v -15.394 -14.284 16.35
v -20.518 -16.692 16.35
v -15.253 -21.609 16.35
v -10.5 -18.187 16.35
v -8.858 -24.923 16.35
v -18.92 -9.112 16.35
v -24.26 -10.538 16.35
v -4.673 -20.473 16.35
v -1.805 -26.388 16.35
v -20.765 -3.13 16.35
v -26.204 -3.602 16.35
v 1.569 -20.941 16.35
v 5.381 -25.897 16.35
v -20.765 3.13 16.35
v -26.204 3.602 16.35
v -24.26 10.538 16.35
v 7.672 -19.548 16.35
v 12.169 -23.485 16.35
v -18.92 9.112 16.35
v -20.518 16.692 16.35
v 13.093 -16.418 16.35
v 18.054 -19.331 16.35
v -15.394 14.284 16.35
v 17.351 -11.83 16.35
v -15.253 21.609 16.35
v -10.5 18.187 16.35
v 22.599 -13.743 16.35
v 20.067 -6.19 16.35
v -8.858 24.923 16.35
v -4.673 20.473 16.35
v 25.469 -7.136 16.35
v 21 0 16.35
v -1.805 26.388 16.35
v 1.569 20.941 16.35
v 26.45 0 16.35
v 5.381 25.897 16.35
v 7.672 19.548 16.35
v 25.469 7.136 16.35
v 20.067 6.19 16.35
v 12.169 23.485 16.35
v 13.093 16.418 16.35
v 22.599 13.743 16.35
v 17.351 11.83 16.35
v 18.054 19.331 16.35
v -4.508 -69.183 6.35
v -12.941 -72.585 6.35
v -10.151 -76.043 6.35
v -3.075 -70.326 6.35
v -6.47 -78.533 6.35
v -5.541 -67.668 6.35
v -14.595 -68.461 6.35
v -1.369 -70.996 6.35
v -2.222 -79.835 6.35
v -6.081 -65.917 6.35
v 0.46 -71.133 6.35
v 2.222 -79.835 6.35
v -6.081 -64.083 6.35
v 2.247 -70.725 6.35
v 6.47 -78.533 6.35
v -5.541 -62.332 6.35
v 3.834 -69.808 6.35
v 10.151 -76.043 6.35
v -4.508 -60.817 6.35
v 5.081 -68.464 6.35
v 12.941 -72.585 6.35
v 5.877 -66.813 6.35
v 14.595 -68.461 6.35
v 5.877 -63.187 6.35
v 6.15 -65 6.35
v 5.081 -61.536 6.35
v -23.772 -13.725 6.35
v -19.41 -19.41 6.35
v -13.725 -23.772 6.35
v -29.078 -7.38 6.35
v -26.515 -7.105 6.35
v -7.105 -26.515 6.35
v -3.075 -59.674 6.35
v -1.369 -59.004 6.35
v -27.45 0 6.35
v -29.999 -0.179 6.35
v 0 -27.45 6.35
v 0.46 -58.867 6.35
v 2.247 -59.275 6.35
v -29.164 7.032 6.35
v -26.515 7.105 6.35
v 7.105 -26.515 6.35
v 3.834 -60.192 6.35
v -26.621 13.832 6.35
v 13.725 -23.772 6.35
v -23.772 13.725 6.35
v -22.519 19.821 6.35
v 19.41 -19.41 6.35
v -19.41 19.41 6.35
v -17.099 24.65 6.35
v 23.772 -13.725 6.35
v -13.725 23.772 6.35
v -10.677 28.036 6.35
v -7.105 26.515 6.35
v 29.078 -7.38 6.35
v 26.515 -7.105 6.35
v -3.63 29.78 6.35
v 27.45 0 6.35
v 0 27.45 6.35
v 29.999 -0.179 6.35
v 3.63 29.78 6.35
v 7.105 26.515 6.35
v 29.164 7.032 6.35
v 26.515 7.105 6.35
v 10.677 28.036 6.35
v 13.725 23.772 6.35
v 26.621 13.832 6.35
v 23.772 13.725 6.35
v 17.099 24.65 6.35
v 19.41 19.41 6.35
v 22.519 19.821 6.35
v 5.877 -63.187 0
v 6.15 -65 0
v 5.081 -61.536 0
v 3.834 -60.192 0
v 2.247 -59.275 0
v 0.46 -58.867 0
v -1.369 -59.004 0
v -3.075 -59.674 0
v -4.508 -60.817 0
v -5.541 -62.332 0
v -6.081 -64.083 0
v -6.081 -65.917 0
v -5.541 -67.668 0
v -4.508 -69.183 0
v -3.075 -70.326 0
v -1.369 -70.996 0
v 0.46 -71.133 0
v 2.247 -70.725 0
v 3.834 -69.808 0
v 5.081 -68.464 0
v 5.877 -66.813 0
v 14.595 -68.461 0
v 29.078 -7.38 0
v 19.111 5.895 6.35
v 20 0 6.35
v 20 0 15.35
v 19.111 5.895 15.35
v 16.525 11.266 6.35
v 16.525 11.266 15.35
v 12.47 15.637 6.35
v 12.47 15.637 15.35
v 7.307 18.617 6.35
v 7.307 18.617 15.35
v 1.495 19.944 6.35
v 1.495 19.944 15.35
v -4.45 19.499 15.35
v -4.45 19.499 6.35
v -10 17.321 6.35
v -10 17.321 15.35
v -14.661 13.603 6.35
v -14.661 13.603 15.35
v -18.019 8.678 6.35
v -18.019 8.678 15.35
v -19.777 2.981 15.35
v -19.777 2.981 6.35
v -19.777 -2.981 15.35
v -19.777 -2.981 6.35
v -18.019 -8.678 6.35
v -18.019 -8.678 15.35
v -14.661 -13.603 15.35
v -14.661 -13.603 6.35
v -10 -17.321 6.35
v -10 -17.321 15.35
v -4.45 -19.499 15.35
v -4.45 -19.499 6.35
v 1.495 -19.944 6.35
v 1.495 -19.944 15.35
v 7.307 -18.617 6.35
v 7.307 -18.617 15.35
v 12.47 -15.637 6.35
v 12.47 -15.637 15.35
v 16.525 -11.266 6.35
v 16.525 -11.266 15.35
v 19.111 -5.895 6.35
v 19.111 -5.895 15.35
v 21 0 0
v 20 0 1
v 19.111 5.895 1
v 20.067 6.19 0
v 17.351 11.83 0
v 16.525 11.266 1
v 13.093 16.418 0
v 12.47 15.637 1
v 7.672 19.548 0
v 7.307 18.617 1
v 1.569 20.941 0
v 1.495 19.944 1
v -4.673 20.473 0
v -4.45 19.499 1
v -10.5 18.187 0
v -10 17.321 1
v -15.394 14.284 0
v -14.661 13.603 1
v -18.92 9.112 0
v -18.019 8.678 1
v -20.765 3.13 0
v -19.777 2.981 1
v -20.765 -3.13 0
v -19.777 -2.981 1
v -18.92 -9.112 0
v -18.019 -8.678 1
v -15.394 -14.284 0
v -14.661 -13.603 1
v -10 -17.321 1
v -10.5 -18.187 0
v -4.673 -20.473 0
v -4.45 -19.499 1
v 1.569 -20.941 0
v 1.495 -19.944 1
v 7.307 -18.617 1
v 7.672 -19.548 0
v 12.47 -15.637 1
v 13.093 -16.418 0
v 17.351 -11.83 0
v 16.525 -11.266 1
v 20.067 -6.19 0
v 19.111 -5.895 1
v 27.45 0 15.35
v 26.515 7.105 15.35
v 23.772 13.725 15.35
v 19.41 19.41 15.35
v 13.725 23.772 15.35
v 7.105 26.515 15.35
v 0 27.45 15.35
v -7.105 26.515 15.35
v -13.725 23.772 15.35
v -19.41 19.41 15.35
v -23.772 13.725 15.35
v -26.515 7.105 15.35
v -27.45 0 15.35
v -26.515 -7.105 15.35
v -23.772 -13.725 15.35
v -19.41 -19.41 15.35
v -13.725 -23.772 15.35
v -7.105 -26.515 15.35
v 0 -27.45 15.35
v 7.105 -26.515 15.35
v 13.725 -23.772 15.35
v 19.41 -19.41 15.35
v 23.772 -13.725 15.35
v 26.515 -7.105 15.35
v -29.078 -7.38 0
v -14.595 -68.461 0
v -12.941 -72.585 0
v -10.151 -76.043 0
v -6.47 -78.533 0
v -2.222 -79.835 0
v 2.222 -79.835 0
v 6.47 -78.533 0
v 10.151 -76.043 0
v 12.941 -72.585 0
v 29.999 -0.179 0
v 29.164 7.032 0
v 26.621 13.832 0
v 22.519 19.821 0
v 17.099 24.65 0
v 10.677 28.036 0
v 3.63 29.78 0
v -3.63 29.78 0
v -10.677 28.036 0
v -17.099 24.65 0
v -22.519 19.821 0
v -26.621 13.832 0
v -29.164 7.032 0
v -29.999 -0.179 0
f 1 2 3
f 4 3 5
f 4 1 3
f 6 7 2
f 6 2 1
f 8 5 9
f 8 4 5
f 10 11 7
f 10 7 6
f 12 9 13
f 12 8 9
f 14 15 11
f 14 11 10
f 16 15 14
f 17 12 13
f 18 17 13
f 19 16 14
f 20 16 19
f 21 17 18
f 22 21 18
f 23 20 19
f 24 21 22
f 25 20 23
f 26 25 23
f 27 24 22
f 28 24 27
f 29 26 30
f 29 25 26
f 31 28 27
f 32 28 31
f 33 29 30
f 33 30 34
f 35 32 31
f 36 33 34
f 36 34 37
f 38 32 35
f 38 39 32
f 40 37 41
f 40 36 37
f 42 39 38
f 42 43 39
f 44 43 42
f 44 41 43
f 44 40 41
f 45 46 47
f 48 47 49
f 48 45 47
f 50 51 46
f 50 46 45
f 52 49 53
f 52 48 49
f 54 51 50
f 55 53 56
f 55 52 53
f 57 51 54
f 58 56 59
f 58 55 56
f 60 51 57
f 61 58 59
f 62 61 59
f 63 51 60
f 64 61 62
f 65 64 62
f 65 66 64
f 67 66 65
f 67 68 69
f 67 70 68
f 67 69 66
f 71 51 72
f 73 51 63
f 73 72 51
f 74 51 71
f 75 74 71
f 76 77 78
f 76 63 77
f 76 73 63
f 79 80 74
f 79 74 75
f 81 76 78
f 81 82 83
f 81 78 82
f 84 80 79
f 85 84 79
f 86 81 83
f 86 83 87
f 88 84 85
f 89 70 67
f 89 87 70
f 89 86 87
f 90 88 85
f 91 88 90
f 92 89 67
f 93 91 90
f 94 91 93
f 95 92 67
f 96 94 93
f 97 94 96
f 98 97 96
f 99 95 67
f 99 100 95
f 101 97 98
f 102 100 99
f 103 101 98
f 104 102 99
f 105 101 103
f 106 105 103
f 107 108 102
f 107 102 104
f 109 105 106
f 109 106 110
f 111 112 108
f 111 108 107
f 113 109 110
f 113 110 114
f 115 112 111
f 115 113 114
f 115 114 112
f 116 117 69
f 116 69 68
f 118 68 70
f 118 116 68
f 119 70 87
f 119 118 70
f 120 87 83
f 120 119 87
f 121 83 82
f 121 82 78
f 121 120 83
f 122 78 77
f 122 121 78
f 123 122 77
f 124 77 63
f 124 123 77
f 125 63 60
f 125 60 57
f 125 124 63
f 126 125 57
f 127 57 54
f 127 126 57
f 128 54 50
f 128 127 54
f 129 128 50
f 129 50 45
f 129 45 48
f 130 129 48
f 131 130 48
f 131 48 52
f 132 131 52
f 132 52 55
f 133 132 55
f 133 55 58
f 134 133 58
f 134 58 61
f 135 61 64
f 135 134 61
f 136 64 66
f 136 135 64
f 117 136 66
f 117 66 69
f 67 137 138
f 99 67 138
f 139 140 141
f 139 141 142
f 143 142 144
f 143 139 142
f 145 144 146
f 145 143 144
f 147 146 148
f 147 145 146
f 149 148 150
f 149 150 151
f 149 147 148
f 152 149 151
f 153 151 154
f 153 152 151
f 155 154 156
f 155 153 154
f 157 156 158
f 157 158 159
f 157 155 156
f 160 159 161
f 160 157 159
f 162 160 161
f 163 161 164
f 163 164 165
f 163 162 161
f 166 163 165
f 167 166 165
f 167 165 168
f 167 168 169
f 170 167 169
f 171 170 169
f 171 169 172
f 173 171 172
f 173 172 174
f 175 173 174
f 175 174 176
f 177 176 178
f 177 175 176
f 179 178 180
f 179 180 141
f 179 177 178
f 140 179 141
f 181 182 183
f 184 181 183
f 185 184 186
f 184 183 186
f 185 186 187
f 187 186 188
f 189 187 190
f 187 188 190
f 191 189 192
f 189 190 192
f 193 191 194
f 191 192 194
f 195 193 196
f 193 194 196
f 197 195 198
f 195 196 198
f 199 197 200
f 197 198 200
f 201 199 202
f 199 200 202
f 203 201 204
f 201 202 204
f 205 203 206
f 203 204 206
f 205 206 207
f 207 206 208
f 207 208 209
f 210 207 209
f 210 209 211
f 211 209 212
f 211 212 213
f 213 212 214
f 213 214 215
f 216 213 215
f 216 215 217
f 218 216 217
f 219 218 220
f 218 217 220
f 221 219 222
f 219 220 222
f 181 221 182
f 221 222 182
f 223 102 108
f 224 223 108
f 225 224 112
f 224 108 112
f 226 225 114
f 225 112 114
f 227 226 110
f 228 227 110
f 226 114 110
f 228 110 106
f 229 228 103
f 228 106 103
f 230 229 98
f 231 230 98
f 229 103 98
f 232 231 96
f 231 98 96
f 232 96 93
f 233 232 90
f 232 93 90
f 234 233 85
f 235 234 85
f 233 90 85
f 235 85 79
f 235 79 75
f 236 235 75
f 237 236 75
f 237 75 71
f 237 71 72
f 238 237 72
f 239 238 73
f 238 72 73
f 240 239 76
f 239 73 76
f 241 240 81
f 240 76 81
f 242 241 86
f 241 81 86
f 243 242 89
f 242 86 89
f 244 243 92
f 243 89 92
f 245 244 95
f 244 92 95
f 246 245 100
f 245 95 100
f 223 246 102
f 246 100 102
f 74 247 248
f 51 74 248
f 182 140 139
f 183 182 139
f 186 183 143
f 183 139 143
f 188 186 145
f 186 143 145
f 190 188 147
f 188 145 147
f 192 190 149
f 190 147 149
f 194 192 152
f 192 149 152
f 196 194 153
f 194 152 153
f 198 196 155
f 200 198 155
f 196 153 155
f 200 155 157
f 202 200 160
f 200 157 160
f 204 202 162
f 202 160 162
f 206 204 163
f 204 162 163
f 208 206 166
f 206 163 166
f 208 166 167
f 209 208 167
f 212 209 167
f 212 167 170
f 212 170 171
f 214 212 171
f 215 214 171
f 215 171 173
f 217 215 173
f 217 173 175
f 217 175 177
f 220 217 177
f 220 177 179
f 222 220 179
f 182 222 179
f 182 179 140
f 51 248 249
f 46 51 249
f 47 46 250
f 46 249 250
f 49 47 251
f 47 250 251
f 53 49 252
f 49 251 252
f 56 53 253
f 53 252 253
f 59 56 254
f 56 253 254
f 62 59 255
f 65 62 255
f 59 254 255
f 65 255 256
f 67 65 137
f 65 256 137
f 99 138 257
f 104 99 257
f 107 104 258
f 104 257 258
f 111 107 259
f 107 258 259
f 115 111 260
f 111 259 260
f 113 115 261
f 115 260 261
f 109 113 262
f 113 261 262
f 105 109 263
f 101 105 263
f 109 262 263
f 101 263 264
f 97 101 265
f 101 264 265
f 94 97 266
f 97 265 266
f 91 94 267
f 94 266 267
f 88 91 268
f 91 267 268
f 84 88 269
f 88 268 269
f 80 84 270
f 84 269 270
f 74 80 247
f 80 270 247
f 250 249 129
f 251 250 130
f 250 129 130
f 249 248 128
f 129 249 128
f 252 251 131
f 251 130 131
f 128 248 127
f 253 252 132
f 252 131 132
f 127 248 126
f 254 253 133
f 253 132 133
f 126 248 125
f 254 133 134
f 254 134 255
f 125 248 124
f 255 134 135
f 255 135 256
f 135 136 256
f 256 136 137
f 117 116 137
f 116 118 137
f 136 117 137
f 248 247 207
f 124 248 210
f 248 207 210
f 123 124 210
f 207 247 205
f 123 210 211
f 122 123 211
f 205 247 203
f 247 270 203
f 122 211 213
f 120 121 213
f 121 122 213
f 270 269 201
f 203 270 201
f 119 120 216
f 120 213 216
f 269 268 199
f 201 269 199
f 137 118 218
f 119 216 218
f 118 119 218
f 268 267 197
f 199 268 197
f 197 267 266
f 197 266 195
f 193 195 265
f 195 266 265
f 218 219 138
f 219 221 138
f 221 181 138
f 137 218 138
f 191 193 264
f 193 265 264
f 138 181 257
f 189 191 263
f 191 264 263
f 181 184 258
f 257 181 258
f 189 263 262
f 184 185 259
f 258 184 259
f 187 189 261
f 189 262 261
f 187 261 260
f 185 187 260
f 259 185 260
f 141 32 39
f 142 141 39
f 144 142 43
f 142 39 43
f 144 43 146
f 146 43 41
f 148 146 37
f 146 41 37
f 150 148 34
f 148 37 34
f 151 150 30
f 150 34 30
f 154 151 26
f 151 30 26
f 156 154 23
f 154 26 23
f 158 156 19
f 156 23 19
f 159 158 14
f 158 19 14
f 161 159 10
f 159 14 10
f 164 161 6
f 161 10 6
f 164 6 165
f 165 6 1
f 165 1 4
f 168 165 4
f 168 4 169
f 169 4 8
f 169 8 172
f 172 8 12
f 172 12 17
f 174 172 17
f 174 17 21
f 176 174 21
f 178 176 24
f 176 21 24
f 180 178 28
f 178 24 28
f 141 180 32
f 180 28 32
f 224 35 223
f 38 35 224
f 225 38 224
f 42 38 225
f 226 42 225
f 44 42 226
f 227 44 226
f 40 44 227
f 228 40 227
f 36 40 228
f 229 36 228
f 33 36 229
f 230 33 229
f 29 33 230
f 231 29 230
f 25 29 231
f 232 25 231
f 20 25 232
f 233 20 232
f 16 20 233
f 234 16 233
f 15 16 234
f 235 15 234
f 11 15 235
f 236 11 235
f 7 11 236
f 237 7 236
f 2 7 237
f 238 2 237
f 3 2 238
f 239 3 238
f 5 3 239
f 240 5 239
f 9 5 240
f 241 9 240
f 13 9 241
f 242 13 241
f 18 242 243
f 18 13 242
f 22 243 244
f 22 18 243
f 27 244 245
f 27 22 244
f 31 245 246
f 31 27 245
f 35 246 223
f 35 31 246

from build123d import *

# Parameters (mm, degrees)
CROQUIS1_R                          = 25
CROQUIS1_R_2                        = 6.15
SALIENTE_EXTRUIR1_DEPTH             = 6.35
CROQUIS2_R                          = 27.45
CROQUIS2_R_2                        = 20
SALIENTE_EXTRUIR2_DEPTH             = 10
SALIENTE_EXTRUIR2_DIRECTION_2_REACH = 87.676
CHAFL_N1_SIZE                       = 1


with BuildPart() as part:
    # Croquis1 → Saliente-Extruir1 (new body)
    with BuildSketch(Plane.XY):
        with BuildLine():
            Line((14.595331362, -68.460679477), (29.078013405, -7.380320889))
            ThreePointArc((29.078013405, -7.380320889), (0, 30), (-29.078013405, -7.380320889))
            Line((-29.078013405, -7.380320889), (-14.595331362, -68.460679477))
            ThreePointArc((-14.595331362, -68.460679477), (0, -80), (14.595331362, -68.460679477))
        make_face()
        Circle(CROQUIS1_R, mode=Mode.SUBTRACT)
        with Locations((0, -65)):
            Circle(CROQUIS1_R_2, mode=Mode.SUBTRACT)
    extrude(amount=SALIENTE_EXTRUIR1_DEPTH)

    # Croquis2 → Saliente-Extruir2 (add)
    with BuildSketch(Plane.XY.offset(6.35)):
        Circle(CROQUIS2_R)
        Circle(CROQUIS2_R_2, mode=Mode.SUBTRACT)
    extrude(amount=SALIENTE_EXTRUIR2_DEPTH)

    # Saliente-Extruir2 direction 2: up to this face of the body (flat: up to its plane)
    saliente_extruir2_direction_2_end = Plane(part.part.faces().sort_by_distance((0, -32.142670277, 0))[0])
    # Croquis2 → Saliente-Extruir2 direction 2 (add, up to the picked face)
    with BuildSketch(Plane.XY.offset(6.35), mode=Mode.PRIVATE) as saliente_extruir2_direction_2_sk1:
        Circle(CROQUIS2_R)
        Circle(CROQUIS2_R_2, mode=Mode.SUBTRACT)
    saliente_extruir2_direction_2_tool1 = split(extrude(saliente_extruir2_direction_2_sk1.sketch, amount=-SALIENTE_EXTRUIR2_DIRECTION_2_REACH, mode=Mode.PRIVATE), bisect_by=saliente_extruir2_direction_2_end, keep=Keep.BOTH, mode=Mode.PRIVATE)
    add(saliente_extruir2_direction_2_tool1.solids().sort_by(Axis((-26.673597, 0, 6.35), (0, 0, -1)))[0])

    # Chaflán1
    chafl_n1_edges = [part.edges().sort_by_distance(p)[0] for p in [
        (-20, 0, 0),
        (-20, 0, 16.35),
        (-27.45, 0, 16.35),
    ]]
    chamfer(chafl_n1_edges, length=CHAFL_N1_SIZE)


solid = part.part
